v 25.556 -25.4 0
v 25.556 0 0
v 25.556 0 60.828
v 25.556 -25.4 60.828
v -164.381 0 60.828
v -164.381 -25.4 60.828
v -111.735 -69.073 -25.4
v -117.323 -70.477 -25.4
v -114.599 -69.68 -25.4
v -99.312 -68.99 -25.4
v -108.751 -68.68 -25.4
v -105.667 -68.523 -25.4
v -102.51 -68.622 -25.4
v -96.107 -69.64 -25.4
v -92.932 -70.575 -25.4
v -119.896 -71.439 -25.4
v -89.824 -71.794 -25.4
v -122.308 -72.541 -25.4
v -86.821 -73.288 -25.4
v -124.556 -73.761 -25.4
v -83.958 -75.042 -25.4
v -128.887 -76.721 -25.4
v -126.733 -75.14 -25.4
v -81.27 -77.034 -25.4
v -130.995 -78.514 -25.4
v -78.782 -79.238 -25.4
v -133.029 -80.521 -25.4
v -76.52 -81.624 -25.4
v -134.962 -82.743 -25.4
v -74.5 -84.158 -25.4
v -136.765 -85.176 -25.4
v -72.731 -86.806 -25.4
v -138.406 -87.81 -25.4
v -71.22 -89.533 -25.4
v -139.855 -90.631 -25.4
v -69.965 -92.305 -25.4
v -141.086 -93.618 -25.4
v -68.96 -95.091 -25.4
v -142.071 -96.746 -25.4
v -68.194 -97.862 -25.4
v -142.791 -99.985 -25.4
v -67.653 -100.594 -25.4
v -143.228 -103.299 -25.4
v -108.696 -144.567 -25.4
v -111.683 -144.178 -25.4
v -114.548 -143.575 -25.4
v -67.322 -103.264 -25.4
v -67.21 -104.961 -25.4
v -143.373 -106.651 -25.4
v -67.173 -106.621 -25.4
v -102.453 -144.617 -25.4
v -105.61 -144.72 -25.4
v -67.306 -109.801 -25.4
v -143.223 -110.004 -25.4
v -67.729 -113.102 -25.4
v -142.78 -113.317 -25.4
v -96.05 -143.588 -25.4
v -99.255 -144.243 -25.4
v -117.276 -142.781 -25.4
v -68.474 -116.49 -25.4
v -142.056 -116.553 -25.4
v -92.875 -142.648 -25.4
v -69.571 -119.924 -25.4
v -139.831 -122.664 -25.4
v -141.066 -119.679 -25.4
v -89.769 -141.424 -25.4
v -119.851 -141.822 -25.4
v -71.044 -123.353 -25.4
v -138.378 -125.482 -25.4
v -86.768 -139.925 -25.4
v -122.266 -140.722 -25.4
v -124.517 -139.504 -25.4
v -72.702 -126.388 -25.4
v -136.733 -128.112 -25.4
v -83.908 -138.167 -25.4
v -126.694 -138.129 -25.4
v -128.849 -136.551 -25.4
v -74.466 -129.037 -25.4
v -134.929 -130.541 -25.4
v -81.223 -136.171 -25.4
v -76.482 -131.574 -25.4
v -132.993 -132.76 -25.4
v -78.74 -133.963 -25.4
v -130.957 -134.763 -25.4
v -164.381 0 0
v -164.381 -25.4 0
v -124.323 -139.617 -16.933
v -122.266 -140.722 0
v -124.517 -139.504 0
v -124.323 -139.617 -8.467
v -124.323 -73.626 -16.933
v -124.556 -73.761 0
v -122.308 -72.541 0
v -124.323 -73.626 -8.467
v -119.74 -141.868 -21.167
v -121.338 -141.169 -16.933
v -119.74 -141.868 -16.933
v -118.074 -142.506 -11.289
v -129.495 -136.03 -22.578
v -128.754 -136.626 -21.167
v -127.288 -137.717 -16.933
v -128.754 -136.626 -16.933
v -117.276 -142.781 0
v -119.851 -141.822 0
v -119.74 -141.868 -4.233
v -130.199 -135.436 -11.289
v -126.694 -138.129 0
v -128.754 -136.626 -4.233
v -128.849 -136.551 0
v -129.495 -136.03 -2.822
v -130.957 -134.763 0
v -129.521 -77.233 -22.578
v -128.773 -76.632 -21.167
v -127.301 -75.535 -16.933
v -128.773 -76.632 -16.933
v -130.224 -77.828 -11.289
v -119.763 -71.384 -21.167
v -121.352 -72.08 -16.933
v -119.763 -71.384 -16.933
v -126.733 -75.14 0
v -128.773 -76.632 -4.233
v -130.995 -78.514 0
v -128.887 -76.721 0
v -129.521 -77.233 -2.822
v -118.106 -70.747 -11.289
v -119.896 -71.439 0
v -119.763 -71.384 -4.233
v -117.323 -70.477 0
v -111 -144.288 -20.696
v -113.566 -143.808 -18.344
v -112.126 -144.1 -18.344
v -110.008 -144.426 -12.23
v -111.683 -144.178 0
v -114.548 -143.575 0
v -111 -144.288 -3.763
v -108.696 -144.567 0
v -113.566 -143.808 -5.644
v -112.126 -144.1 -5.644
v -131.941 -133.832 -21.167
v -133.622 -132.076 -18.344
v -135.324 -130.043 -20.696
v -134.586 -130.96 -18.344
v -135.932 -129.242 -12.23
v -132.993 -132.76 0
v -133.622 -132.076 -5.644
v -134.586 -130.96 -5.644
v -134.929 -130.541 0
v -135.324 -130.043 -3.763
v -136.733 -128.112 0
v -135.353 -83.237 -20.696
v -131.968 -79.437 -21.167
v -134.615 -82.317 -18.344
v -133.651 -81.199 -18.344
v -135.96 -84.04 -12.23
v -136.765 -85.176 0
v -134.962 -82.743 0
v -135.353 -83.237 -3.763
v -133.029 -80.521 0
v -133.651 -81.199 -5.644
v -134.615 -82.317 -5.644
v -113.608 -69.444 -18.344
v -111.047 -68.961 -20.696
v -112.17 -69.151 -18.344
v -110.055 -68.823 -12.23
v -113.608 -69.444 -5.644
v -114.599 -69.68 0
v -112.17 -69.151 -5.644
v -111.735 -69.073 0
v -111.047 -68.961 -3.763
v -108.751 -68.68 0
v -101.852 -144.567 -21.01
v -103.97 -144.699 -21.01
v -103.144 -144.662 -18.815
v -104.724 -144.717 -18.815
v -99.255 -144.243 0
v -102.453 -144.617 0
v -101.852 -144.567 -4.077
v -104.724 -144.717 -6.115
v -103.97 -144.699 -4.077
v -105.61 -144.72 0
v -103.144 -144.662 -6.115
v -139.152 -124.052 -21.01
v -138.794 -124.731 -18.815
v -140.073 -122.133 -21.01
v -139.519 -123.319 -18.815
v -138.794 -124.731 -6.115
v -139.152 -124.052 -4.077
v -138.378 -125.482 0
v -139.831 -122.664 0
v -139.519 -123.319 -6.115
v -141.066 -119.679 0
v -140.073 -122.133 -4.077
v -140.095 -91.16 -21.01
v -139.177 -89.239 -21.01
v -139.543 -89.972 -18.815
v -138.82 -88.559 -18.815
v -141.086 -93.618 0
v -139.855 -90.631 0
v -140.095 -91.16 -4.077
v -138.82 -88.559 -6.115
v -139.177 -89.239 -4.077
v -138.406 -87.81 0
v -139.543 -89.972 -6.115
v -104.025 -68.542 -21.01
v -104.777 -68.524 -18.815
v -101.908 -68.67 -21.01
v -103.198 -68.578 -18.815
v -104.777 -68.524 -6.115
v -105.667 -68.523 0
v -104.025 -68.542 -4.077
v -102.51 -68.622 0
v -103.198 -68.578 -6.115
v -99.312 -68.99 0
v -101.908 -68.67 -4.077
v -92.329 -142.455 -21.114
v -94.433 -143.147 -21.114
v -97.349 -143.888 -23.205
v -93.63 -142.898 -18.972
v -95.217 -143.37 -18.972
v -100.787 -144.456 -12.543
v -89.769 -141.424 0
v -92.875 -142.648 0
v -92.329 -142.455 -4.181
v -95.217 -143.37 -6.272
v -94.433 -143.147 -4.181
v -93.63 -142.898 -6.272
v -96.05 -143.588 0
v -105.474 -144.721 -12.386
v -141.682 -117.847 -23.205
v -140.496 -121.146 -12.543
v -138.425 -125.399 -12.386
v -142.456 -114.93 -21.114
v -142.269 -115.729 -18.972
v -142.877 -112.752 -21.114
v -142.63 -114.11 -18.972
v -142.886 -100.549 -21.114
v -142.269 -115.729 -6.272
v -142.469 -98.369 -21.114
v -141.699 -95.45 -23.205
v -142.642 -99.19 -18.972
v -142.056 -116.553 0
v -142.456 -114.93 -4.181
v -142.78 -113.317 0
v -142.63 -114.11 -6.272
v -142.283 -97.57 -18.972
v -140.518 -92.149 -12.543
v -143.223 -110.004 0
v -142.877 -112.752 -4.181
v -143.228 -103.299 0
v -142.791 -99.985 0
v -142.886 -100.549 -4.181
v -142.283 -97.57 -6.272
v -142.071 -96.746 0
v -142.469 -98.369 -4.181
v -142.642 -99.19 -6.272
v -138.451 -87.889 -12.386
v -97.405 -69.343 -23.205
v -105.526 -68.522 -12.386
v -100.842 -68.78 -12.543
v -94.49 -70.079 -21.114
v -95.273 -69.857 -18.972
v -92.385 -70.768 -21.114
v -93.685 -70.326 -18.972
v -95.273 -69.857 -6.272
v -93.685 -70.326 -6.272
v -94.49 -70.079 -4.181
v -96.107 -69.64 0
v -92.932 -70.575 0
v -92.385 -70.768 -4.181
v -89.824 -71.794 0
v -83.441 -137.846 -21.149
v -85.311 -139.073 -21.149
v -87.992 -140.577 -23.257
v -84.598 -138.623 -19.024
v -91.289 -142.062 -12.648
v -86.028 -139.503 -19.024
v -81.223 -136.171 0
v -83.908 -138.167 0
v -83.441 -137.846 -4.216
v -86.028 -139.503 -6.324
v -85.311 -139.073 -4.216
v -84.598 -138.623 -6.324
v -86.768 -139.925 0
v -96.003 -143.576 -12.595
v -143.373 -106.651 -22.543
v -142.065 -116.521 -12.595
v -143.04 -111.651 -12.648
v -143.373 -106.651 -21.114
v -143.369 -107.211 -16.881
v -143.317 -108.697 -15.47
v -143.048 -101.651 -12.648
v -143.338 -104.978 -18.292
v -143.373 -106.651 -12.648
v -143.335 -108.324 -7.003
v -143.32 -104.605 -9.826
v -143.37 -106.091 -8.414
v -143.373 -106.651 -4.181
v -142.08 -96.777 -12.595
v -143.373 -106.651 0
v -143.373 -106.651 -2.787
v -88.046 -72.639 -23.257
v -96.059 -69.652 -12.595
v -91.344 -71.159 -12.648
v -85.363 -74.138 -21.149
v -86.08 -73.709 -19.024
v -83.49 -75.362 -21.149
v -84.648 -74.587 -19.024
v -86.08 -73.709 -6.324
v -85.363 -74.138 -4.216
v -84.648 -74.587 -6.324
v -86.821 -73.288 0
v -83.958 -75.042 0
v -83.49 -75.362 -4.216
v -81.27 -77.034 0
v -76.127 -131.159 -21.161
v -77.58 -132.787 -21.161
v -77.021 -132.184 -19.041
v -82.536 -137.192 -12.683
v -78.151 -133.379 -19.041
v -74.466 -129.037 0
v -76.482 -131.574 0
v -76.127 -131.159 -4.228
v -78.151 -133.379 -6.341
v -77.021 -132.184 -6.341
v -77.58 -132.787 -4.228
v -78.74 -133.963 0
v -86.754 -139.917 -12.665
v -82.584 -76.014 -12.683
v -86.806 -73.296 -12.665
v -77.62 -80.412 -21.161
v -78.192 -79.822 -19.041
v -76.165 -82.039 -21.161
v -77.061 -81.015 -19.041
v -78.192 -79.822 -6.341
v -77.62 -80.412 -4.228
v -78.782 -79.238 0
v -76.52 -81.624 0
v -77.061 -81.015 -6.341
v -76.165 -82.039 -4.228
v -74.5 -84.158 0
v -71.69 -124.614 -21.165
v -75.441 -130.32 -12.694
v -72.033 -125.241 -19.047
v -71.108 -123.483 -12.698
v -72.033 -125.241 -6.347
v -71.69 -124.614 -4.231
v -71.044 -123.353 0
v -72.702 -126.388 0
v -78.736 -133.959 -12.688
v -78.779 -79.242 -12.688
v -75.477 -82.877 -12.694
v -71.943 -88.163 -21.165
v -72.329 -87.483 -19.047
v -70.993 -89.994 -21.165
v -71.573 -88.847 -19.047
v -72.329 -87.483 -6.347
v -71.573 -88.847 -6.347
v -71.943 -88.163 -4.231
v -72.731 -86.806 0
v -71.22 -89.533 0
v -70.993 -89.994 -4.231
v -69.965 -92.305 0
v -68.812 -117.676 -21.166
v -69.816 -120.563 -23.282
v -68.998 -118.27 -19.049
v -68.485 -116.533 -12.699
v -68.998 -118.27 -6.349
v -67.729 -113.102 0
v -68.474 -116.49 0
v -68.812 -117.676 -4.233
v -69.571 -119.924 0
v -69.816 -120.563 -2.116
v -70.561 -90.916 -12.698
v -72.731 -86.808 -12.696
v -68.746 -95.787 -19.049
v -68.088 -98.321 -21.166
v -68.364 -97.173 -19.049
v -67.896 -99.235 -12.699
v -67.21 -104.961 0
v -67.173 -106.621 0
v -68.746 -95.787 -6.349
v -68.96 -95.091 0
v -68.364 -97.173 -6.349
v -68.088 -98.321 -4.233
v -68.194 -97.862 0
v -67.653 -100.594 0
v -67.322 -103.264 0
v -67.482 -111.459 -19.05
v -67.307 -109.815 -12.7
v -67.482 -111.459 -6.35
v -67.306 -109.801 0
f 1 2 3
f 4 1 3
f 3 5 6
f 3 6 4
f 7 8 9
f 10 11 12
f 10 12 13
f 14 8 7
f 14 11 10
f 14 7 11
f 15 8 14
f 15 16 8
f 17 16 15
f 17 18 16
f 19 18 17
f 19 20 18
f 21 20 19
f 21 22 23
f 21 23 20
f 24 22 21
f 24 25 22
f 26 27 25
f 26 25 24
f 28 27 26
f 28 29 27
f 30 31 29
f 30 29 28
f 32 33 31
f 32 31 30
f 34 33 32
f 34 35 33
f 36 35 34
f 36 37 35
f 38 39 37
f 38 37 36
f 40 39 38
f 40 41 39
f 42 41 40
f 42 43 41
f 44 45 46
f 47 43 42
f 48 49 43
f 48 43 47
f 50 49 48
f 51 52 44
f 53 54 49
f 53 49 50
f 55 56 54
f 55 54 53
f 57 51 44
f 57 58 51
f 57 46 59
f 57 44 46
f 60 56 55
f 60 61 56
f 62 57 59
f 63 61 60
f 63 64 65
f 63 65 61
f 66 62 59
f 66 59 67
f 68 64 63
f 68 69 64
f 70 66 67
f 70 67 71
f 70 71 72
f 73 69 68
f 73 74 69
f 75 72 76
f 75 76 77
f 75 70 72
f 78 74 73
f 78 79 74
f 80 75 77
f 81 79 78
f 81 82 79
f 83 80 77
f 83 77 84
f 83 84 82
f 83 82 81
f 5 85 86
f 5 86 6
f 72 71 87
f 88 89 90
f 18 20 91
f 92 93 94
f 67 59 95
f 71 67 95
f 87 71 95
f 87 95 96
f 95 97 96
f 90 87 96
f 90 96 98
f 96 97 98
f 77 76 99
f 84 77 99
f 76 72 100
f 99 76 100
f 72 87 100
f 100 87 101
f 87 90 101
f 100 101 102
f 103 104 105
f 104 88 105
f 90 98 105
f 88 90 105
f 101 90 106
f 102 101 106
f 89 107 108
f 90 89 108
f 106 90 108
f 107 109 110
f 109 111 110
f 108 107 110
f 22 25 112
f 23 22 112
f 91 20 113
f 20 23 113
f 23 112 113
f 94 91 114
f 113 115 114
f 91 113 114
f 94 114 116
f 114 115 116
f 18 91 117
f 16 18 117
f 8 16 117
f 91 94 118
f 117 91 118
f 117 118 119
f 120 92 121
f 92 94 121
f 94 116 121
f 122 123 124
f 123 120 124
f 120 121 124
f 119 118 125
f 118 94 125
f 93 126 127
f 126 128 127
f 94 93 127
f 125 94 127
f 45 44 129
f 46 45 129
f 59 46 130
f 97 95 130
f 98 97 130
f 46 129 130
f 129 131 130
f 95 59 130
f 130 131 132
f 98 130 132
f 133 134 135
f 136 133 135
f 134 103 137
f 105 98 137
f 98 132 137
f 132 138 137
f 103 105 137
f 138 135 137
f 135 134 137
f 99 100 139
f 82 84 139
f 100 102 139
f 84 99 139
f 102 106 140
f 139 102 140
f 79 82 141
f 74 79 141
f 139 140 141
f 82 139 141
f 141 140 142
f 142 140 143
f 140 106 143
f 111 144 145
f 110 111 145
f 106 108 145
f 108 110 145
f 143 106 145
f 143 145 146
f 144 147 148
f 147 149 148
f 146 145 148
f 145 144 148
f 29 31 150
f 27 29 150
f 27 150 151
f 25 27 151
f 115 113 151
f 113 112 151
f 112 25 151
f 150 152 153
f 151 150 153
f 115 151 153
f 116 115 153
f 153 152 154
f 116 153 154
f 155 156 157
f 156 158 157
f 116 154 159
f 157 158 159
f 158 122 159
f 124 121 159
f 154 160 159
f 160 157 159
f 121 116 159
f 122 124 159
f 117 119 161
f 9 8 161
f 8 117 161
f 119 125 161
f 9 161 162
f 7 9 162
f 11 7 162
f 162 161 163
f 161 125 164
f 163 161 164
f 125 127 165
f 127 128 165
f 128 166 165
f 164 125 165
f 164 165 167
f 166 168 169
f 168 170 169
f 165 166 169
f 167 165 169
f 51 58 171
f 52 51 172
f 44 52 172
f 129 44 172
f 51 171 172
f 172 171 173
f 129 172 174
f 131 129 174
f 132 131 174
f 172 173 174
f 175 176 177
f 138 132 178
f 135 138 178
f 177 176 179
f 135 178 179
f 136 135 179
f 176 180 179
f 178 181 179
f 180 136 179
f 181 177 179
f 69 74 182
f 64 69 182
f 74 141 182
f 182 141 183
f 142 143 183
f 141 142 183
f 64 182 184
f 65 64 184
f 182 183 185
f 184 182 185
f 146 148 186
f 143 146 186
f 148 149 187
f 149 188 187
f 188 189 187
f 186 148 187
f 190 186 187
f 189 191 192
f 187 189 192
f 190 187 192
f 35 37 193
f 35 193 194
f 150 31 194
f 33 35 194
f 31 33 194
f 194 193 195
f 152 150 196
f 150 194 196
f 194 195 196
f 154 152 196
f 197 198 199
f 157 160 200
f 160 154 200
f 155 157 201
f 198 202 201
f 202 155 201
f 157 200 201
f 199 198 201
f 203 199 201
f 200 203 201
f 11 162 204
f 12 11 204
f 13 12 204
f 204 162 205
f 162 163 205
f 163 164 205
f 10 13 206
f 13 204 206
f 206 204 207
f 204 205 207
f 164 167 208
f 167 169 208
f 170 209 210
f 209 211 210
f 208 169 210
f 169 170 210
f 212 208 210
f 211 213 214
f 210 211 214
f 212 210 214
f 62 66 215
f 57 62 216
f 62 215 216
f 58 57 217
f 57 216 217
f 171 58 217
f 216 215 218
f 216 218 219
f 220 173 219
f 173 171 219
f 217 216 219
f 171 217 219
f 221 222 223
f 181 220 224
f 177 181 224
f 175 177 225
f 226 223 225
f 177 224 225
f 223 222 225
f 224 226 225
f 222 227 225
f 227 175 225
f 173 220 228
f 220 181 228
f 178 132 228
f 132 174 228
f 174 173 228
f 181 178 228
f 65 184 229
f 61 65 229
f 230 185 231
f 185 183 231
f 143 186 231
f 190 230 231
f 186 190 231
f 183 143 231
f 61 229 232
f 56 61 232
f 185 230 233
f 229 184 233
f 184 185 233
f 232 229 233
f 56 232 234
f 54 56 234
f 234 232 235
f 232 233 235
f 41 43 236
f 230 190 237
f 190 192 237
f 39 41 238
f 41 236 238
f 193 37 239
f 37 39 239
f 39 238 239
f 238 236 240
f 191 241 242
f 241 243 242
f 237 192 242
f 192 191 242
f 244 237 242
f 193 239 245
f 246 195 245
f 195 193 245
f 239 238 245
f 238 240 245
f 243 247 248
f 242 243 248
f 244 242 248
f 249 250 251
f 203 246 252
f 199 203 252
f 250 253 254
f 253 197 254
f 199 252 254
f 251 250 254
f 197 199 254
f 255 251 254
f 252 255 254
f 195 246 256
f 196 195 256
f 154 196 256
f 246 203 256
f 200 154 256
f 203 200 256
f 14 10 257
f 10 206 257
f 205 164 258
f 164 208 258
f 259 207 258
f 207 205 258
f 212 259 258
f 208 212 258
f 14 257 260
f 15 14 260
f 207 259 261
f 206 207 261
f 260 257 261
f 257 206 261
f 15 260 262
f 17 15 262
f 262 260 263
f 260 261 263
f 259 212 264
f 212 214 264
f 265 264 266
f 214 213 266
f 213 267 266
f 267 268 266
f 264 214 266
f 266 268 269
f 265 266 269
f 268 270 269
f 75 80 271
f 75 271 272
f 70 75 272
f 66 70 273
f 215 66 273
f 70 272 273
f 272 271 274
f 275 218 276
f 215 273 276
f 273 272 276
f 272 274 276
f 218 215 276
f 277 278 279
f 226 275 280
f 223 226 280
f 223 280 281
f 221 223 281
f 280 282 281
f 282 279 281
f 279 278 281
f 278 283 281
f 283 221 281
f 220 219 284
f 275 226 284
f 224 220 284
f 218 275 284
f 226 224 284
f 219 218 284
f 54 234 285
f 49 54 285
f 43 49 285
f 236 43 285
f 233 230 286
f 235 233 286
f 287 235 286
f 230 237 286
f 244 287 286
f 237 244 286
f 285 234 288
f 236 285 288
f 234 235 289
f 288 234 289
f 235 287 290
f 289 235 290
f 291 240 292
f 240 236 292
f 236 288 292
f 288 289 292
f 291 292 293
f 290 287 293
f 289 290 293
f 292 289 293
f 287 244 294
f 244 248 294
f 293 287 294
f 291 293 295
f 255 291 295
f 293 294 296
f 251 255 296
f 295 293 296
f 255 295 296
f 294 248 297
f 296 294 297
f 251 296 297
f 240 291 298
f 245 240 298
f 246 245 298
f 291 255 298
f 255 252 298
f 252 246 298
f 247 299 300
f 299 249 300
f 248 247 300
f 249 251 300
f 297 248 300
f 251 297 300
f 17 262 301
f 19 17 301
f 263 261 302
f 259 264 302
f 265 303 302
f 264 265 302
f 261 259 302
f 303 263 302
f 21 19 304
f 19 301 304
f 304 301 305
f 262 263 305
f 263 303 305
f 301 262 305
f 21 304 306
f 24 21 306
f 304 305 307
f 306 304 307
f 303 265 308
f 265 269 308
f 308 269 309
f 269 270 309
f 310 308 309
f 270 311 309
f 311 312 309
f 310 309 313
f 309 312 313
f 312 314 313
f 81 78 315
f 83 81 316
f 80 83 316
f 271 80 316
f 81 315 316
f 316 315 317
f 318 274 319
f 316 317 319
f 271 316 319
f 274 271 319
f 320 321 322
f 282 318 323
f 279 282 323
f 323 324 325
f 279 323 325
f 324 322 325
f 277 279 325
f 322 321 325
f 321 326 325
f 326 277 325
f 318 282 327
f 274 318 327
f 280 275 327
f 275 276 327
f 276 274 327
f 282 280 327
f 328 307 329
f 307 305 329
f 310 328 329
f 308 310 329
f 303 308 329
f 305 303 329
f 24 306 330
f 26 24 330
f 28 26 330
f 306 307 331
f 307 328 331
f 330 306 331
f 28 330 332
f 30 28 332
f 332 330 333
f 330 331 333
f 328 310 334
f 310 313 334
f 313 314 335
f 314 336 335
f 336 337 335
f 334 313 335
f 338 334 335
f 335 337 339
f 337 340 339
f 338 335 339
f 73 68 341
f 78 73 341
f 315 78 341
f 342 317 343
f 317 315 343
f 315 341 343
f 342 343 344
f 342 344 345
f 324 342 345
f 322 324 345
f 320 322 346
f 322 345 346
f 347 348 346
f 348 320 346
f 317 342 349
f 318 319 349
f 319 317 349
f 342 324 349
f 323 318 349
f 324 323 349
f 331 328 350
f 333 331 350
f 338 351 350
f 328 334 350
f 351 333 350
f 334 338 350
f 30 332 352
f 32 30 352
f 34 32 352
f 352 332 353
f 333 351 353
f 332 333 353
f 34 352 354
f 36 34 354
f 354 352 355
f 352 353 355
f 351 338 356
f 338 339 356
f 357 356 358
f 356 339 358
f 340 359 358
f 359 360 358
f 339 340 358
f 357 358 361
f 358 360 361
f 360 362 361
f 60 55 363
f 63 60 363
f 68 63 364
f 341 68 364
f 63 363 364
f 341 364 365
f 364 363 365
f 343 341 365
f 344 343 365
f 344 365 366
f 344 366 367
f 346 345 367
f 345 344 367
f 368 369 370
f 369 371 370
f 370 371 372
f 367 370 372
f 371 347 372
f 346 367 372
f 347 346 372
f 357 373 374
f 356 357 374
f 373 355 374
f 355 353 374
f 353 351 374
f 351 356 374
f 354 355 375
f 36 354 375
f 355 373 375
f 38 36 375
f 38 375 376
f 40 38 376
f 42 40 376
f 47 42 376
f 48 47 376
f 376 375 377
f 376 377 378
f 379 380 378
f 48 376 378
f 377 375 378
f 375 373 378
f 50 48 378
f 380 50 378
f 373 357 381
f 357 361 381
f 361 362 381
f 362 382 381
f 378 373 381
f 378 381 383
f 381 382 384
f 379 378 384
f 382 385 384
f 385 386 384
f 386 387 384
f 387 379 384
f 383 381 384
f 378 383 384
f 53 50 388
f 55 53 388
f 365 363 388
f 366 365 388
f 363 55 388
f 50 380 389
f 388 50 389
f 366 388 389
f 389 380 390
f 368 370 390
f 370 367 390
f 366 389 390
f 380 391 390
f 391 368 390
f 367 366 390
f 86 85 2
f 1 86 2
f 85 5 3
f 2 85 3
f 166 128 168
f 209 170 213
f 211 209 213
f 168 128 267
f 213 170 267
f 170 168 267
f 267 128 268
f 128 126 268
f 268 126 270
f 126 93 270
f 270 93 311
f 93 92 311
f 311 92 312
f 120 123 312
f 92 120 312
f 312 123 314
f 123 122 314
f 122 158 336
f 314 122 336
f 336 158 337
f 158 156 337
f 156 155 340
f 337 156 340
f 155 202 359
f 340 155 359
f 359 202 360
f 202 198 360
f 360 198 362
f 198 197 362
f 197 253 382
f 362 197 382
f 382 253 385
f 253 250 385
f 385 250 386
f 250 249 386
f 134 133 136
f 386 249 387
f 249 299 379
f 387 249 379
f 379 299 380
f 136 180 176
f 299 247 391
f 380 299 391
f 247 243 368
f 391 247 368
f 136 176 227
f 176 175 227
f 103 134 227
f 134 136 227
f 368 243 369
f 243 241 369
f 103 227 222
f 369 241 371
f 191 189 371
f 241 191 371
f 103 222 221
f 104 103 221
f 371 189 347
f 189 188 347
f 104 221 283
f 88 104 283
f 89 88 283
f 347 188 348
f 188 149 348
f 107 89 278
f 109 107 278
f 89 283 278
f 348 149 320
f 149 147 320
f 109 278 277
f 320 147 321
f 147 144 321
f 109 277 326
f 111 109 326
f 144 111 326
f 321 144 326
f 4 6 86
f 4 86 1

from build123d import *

# Parameters (mm, degrees)
F0_W     = 189.936529845
F0_H     = 60.828410089
F1_DEPTH = 25.4
F5_DEPTH = 25.4


# Not quite as in the source:
# - the program builds the solid bodies; features that only make, move or delete a surface that nothing else refers to are left out


with BuildPart() as f1:
    # F0 (on Front) → F1 (new body)
    with BuildSketch(Plane.XZ):
        with Locations((-69.4125667214, 30.4142050445)):
            Rectangle(F0_W, F0_H)
    extrude(amount=F1_DEPTH)


with BuildPart() as f5:
    # F4 (on face) → F5 (new body)
    with BuildSketch(Plane(origin=(0, 0, 0), x_dir=(1, 0, 0), z_dir=(0, 0, -1))):
        with BuildLine():
            add(Edge.make_bspline(
                [(-67.1733883262, 106.6212207079), (-67.1733883262, 172.6123564763), (-124.3233883262, 139.6167885921), (-181.4733883262, 106.6212207079), (-124.3233883262, 73.6256528237), (-67.1733883262, 40.6300849395), (-67.1733883262, 106.6212207079)],
                knots=[0, 0, 0, 2.0943951024, 2.0943951024, 4.1887902048, 4.1887902048, 6.2831853072, 6.2831853072, 6.2831853072], degree=2, weights=[1, 0.5, 1, 0.5, 1, 0.5, 1]))
        make_face()
    extrude(amount=F5_DEPTH)


solid = Compound([f1.part, f5.part])
